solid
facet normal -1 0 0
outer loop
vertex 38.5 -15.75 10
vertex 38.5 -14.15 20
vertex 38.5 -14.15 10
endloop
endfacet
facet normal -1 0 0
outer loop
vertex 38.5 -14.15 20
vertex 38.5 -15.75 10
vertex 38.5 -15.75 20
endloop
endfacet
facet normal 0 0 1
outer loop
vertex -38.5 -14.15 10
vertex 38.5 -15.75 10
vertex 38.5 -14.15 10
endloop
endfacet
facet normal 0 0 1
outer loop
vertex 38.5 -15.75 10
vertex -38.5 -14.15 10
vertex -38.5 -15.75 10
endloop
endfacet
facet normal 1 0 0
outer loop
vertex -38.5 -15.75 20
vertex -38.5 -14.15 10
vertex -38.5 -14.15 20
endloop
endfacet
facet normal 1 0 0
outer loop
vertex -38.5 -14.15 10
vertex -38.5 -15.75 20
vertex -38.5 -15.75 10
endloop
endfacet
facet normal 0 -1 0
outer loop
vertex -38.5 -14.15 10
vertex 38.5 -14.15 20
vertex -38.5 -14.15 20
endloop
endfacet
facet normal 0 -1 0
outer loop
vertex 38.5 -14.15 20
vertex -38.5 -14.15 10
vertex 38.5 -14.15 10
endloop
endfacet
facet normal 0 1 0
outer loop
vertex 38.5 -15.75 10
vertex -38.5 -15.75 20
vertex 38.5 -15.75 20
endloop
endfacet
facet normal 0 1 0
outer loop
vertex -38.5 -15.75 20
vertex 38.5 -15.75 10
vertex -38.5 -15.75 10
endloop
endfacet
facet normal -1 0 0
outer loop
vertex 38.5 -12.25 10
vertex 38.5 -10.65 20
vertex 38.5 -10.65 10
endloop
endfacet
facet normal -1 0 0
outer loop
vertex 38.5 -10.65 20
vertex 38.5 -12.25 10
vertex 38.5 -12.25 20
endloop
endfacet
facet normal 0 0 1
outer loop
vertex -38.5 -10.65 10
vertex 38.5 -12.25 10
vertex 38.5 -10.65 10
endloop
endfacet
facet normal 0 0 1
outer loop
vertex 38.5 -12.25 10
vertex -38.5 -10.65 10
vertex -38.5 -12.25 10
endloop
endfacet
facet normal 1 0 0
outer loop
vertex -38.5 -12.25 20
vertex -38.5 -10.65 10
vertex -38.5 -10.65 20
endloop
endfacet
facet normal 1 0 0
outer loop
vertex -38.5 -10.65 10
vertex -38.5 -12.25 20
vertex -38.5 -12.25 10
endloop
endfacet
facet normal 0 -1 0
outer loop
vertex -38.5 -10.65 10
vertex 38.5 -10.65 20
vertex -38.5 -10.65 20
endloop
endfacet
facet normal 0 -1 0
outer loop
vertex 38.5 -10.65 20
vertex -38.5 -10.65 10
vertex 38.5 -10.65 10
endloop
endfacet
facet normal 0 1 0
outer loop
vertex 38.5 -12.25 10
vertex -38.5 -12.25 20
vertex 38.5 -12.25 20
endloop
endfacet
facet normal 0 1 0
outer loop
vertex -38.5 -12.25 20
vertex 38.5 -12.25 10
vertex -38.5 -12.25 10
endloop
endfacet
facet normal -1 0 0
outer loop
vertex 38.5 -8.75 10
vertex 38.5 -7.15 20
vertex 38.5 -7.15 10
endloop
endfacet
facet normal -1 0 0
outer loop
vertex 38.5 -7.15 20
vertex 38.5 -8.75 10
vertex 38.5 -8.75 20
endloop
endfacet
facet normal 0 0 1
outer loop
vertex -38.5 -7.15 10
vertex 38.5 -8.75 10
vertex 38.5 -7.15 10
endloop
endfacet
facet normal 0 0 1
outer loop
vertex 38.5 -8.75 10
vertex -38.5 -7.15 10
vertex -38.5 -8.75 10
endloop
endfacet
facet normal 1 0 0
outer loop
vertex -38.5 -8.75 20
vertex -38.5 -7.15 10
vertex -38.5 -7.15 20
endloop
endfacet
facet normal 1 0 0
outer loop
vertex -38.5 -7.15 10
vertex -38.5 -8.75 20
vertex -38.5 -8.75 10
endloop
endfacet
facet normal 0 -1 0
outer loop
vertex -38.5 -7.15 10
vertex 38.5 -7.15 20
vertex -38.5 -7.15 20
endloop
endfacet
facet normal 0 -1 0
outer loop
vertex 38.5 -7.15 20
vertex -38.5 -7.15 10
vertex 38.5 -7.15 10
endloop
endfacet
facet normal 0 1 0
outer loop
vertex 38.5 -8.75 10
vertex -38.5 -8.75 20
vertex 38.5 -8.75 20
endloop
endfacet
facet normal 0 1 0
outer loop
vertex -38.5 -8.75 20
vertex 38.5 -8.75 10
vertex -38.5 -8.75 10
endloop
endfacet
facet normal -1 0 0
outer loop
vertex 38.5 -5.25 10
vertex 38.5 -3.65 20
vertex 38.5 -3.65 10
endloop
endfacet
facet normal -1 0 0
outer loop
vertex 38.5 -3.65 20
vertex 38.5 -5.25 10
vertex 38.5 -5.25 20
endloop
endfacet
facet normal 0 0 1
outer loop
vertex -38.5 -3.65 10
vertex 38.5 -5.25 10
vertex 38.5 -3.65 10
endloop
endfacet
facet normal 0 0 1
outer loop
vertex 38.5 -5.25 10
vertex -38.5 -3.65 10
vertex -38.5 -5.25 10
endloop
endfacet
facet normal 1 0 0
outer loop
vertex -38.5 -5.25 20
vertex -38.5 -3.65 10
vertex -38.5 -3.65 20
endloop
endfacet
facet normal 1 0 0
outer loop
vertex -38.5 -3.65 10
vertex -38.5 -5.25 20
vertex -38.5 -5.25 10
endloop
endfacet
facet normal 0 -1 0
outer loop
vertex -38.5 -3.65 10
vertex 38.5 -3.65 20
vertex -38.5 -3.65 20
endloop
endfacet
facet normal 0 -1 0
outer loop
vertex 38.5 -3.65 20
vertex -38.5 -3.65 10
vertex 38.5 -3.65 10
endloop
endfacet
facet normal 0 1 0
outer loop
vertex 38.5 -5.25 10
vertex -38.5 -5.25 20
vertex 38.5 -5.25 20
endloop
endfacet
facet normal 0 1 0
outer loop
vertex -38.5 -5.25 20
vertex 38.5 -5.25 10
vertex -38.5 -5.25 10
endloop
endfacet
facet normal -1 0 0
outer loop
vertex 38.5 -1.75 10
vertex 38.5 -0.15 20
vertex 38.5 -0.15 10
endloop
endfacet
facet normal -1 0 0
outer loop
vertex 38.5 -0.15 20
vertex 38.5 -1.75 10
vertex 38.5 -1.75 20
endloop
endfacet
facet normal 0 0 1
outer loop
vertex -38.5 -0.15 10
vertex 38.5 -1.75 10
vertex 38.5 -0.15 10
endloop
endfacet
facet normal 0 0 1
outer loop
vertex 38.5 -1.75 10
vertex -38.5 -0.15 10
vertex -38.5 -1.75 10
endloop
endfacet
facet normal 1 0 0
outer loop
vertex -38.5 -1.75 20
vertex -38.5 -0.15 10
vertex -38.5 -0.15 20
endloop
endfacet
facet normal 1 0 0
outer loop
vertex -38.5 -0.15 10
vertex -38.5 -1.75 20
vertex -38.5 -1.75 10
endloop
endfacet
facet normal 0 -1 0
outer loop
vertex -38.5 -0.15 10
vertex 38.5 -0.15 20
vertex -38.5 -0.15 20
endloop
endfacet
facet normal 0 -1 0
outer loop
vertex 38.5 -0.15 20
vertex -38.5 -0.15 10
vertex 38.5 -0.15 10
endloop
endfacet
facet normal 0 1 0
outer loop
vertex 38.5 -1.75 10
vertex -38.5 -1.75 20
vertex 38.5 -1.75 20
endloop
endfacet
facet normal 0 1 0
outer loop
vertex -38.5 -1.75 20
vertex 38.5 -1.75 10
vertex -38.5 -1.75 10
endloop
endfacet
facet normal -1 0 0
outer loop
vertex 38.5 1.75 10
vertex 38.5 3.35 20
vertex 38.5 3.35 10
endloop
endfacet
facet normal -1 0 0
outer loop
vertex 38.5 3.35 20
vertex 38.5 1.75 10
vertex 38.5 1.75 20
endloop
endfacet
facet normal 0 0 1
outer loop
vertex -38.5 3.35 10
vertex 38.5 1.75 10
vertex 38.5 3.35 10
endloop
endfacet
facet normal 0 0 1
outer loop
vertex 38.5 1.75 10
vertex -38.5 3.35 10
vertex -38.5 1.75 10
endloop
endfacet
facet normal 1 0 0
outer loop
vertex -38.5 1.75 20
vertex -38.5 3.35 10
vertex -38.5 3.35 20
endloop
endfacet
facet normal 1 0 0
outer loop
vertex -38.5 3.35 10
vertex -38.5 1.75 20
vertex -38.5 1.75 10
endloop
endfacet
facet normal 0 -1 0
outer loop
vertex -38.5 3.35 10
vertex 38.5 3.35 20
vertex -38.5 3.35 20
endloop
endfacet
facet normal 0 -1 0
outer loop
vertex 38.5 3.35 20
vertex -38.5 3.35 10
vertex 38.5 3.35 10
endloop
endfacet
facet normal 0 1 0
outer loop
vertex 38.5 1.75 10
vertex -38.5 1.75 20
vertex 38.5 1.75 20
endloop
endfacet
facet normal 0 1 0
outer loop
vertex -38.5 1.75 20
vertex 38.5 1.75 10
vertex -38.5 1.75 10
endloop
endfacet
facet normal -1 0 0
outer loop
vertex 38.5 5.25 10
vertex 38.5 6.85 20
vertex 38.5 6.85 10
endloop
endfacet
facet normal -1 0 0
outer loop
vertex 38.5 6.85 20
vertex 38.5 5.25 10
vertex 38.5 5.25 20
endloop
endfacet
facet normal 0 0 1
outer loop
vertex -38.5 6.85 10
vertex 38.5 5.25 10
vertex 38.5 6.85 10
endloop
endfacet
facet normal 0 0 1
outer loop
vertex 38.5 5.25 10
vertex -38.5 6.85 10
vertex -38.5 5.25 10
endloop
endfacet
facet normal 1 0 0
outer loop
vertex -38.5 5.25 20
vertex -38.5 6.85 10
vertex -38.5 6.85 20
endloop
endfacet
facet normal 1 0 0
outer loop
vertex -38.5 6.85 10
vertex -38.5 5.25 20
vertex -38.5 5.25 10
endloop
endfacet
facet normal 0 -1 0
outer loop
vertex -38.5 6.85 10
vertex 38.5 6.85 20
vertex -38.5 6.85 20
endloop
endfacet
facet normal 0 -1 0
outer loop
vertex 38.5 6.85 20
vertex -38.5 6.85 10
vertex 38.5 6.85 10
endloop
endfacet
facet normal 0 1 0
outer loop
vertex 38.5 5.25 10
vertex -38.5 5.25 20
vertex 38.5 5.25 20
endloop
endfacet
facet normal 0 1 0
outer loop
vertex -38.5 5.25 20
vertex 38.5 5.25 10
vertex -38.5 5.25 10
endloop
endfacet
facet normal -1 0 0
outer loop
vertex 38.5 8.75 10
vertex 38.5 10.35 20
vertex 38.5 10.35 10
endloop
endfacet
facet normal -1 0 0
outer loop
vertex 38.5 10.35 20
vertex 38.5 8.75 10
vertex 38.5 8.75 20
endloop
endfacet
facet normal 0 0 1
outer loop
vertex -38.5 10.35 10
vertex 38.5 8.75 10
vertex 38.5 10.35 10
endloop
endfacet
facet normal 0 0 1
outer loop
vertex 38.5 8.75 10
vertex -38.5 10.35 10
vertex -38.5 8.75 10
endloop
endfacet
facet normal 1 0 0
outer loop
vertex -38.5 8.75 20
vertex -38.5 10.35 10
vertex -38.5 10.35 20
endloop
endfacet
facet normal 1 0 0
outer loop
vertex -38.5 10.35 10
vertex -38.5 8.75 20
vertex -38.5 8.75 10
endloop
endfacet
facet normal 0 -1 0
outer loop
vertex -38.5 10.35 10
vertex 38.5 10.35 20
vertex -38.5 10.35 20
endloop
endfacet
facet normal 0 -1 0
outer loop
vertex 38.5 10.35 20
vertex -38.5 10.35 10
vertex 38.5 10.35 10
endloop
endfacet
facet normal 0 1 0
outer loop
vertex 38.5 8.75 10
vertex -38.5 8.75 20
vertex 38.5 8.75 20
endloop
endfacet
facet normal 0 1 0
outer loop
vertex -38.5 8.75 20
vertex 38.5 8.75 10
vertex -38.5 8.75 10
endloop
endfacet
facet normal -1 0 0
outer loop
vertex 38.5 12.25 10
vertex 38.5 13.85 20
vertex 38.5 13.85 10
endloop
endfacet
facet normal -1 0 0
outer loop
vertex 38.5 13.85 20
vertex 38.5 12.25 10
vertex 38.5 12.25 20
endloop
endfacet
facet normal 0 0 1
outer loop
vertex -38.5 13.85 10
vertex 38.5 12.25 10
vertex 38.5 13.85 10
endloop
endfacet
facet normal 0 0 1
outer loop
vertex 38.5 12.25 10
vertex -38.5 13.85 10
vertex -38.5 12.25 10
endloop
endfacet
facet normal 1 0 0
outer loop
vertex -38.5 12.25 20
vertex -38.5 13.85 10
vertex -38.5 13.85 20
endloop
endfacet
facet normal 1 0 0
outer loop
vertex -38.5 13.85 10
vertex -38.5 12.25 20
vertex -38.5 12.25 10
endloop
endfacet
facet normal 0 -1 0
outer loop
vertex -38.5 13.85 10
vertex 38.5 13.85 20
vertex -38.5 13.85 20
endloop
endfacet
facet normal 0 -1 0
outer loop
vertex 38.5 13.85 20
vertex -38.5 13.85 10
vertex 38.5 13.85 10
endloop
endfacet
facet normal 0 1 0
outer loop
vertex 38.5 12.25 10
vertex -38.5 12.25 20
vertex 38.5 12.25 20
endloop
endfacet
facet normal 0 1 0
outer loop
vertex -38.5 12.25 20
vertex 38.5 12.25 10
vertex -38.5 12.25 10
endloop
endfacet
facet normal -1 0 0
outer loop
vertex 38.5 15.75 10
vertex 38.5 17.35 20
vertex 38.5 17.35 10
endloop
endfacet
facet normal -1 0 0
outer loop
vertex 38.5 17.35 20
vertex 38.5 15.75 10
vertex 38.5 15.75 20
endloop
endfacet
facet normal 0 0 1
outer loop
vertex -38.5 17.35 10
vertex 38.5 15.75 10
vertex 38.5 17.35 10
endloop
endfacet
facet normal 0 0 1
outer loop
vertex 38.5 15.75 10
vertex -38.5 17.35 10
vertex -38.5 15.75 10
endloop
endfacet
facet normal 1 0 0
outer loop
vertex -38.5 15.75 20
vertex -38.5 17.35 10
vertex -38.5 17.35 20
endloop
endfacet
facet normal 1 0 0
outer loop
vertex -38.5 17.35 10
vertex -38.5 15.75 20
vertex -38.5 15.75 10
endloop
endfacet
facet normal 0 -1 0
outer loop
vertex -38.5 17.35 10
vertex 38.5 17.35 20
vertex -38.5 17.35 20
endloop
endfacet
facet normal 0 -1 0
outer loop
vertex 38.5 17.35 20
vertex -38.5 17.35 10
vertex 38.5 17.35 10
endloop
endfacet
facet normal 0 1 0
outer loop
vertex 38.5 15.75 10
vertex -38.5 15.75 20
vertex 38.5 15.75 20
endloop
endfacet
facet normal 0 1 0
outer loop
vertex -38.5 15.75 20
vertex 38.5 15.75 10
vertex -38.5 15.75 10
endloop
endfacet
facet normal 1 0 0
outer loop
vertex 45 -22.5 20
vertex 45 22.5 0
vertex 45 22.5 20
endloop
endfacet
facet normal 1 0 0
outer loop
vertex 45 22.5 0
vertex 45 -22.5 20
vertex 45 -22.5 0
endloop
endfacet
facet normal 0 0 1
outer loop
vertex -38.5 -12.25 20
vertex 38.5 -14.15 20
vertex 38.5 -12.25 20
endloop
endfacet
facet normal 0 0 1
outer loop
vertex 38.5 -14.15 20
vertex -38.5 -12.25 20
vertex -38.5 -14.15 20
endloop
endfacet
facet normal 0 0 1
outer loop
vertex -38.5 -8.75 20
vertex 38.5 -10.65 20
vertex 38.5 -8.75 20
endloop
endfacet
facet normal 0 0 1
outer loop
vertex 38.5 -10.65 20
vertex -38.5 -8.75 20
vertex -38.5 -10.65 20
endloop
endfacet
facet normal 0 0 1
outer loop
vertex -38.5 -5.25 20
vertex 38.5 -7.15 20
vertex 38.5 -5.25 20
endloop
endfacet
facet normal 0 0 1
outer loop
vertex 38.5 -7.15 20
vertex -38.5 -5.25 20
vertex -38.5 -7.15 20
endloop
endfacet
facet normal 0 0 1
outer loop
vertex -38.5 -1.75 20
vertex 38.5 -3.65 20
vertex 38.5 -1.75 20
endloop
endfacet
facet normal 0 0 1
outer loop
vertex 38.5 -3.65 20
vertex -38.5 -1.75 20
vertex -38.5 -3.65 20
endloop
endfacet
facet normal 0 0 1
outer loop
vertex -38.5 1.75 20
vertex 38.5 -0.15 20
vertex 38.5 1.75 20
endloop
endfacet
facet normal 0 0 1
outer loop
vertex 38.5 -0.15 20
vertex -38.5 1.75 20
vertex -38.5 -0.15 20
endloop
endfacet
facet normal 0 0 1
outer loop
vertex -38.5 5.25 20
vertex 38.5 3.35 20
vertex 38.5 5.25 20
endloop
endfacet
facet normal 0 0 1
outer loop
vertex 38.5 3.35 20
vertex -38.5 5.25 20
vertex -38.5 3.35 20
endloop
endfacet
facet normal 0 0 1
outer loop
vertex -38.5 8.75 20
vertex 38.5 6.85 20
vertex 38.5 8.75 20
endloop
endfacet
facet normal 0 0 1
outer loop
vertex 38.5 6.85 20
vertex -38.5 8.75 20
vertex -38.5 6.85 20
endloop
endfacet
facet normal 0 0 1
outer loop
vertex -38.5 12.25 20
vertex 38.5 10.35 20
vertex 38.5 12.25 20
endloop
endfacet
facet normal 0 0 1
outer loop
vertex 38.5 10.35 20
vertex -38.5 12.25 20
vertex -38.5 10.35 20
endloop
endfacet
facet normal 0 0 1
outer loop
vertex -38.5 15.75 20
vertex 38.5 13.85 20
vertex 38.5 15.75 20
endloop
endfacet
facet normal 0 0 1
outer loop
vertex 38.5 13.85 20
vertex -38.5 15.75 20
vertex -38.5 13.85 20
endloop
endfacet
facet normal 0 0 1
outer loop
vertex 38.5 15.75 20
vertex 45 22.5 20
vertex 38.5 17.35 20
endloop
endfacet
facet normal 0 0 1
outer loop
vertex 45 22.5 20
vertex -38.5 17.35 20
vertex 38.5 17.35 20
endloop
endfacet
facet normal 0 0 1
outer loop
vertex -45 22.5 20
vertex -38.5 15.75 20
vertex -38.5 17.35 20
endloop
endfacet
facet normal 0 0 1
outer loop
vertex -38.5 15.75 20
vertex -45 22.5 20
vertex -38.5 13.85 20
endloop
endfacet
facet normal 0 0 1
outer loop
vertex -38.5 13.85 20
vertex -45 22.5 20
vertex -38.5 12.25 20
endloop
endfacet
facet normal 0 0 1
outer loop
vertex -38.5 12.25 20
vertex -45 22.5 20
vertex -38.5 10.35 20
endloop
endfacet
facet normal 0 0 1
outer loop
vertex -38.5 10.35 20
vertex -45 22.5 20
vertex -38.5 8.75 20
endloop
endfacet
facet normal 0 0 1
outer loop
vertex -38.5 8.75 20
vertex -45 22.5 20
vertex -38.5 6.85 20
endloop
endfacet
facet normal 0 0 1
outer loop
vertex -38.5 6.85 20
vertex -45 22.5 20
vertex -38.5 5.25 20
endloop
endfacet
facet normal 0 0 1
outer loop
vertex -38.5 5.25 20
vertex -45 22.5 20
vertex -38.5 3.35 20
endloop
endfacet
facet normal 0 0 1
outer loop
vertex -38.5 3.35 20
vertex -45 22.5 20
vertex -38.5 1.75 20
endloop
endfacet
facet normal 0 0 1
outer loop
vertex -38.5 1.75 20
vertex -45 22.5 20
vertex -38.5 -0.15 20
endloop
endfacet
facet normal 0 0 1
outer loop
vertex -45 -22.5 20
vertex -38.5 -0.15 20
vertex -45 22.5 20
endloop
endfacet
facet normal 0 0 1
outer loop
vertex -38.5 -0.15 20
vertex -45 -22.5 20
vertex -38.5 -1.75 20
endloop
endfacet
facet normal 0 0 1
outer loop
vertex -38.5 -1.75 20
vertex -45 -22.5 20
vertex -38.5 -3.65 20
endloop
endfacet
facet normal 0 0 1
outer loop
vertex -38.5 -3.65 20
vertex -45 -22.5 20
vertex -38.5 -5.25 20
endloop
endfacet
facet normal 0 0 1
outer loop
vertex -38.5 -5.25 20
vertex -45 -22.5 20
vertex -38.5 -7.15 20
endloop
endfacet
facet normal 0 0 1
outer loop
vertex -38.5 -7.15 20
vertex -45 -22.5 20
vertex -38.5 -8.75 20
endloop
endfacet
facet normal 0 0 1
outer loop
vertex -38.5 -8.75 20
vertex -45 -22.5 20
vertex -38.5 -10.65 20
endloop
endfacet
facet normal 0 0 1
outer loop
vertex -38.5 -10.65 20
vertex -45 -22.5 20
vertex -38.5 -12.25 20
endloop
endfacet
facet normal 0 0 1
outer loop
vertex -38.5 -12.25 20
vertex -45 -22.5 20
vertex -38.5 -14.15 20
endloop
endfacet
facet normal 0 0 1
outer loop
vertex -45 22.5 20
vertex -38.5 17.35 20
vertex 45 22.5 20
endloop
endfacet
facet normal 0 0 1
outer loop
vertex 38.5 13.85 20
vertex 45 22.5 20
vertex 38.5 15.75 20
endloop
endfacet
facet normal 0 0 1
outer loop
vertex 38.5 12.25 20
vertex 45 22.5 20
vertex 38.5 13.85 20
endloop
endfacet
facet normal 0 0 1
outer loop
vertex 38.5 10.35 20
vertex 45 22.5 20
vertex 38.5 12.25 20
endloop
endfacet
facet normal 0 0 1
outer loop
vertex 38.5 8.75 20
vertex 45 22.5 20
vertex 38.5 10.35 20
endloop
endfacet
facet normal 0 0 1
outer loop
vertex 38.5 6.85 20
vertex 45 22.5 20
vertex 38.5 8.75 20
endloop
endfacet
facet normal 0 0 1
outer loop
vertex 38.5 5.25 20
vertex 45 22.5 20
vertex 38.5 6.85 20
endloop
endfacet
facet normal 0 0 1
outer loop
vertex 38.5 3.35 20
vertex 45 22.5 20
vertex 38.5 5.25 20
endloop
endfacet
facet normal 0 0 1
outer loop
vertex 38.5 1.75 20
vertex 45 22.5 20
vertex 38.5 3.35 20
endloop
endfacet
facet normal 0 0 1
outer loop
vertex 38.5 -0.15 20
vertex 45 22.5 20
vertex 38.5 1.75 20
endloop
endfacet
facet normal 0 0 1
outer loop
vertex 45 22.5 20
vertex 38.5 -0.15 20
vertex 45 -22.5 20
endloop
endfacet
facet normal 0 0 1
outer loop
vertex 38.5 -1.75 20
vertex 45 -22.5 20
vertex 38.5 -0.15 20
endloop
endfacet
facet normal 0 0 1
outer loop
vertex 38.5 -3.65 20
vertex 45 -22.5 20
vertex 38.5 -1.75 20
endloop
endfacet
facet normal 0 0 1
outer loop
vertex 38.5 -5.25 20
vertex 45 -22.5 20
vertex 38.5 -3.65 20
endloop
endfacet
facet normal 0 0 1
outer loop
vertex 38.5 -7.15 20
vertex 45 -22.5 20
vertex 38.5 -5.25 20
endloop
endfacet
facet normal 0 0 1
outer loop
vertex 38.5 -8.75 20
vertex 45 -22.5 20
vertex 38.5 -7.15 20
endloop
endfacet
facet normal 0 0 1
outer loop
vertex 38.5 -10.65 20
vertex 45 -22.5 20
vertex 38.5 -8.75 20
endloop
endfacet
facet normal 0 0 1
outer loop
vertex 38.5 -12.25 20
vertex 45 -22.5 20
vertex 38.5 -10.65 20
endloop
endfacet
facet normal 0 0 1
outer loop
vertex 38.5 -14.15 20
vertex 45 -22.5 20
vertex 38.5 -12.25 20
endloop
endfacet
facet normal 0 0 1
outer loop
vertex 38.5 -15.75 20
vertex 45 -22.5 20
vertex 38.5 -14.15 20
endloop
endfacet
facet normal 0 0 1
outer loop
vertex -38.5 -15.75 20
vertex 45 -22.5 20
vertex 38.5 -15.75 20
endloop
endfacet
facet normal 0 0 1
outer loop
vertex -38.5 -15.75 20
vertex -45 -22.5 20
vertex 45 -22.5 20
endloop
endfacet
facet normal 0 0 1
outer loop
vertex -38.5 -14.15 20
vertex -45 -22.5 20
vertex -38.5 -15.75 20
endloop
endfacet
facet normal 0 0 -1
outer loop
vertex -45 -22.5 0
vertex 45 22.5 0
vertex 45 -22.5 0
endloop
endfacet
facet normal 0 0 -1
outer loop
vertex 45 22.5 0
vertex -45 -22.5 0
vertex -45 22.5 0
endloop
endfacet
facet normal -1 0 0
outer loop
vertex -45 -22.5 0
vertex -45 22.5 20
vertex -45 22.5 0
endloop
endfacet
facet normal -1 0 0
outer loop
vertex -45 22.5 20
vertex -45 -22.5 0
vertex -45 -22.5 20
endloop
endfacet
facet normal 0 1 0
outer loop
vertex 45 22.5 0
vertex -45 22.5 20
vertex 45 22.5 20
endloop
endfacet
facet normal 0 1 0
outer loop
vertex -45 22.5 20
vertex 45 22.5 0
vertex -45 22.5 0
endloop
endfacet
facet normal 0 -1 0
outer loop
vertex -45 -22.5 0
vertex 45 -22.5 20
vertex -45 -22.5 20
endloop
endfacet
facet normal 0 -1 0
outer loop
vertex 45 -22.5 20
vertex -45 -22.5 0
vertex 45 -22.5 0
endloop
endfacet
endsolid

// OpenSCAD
// Slide drying rack - holds 10 microscope slides upright on their long edge
// Print orientation: base block on the bed (z = 0), slots open upward.

// ---------------- Parameters ----------------
block_len    = 90;    // block length along X (mm)
block_wid    = 45;    // block width along Y (mm)
block_h      = 20;    // block height along Z (mm)

slot_len     = 77;    // slot length along X (mm)
slot_w       = 1.6;   // slot width along Y (mm)
slot_depth   = 10;    // slot depth from top face (mm)
slot_pitch   = 3.5;   // centre-to-centre spacing of slots in Y (mm)
slot_count   = 10;    // number of slide slots

eps          = 0.5;   // overshoot so cutters pass through the top face (mm)

$fn = 64;

// ---------------- Model ----------------
difference() {
    // Base block, centred in X and Y, sitting on z = 0
    translate([-block_len/2, -block_wid/2, 0])
        cube([block_len, block_wid, block_h]);

    // Row of parallel slots, centred on the block in X and Y
    for (i = [0 : slot_count - 1]) {
        y = (i - (slot_count - 1)/2) * slot_pitch;
        translate([-slot_len/2, y, block_h - slot_depth])
            cube([slot_len, slot_w, slot_depth + eps]);
    }
}
